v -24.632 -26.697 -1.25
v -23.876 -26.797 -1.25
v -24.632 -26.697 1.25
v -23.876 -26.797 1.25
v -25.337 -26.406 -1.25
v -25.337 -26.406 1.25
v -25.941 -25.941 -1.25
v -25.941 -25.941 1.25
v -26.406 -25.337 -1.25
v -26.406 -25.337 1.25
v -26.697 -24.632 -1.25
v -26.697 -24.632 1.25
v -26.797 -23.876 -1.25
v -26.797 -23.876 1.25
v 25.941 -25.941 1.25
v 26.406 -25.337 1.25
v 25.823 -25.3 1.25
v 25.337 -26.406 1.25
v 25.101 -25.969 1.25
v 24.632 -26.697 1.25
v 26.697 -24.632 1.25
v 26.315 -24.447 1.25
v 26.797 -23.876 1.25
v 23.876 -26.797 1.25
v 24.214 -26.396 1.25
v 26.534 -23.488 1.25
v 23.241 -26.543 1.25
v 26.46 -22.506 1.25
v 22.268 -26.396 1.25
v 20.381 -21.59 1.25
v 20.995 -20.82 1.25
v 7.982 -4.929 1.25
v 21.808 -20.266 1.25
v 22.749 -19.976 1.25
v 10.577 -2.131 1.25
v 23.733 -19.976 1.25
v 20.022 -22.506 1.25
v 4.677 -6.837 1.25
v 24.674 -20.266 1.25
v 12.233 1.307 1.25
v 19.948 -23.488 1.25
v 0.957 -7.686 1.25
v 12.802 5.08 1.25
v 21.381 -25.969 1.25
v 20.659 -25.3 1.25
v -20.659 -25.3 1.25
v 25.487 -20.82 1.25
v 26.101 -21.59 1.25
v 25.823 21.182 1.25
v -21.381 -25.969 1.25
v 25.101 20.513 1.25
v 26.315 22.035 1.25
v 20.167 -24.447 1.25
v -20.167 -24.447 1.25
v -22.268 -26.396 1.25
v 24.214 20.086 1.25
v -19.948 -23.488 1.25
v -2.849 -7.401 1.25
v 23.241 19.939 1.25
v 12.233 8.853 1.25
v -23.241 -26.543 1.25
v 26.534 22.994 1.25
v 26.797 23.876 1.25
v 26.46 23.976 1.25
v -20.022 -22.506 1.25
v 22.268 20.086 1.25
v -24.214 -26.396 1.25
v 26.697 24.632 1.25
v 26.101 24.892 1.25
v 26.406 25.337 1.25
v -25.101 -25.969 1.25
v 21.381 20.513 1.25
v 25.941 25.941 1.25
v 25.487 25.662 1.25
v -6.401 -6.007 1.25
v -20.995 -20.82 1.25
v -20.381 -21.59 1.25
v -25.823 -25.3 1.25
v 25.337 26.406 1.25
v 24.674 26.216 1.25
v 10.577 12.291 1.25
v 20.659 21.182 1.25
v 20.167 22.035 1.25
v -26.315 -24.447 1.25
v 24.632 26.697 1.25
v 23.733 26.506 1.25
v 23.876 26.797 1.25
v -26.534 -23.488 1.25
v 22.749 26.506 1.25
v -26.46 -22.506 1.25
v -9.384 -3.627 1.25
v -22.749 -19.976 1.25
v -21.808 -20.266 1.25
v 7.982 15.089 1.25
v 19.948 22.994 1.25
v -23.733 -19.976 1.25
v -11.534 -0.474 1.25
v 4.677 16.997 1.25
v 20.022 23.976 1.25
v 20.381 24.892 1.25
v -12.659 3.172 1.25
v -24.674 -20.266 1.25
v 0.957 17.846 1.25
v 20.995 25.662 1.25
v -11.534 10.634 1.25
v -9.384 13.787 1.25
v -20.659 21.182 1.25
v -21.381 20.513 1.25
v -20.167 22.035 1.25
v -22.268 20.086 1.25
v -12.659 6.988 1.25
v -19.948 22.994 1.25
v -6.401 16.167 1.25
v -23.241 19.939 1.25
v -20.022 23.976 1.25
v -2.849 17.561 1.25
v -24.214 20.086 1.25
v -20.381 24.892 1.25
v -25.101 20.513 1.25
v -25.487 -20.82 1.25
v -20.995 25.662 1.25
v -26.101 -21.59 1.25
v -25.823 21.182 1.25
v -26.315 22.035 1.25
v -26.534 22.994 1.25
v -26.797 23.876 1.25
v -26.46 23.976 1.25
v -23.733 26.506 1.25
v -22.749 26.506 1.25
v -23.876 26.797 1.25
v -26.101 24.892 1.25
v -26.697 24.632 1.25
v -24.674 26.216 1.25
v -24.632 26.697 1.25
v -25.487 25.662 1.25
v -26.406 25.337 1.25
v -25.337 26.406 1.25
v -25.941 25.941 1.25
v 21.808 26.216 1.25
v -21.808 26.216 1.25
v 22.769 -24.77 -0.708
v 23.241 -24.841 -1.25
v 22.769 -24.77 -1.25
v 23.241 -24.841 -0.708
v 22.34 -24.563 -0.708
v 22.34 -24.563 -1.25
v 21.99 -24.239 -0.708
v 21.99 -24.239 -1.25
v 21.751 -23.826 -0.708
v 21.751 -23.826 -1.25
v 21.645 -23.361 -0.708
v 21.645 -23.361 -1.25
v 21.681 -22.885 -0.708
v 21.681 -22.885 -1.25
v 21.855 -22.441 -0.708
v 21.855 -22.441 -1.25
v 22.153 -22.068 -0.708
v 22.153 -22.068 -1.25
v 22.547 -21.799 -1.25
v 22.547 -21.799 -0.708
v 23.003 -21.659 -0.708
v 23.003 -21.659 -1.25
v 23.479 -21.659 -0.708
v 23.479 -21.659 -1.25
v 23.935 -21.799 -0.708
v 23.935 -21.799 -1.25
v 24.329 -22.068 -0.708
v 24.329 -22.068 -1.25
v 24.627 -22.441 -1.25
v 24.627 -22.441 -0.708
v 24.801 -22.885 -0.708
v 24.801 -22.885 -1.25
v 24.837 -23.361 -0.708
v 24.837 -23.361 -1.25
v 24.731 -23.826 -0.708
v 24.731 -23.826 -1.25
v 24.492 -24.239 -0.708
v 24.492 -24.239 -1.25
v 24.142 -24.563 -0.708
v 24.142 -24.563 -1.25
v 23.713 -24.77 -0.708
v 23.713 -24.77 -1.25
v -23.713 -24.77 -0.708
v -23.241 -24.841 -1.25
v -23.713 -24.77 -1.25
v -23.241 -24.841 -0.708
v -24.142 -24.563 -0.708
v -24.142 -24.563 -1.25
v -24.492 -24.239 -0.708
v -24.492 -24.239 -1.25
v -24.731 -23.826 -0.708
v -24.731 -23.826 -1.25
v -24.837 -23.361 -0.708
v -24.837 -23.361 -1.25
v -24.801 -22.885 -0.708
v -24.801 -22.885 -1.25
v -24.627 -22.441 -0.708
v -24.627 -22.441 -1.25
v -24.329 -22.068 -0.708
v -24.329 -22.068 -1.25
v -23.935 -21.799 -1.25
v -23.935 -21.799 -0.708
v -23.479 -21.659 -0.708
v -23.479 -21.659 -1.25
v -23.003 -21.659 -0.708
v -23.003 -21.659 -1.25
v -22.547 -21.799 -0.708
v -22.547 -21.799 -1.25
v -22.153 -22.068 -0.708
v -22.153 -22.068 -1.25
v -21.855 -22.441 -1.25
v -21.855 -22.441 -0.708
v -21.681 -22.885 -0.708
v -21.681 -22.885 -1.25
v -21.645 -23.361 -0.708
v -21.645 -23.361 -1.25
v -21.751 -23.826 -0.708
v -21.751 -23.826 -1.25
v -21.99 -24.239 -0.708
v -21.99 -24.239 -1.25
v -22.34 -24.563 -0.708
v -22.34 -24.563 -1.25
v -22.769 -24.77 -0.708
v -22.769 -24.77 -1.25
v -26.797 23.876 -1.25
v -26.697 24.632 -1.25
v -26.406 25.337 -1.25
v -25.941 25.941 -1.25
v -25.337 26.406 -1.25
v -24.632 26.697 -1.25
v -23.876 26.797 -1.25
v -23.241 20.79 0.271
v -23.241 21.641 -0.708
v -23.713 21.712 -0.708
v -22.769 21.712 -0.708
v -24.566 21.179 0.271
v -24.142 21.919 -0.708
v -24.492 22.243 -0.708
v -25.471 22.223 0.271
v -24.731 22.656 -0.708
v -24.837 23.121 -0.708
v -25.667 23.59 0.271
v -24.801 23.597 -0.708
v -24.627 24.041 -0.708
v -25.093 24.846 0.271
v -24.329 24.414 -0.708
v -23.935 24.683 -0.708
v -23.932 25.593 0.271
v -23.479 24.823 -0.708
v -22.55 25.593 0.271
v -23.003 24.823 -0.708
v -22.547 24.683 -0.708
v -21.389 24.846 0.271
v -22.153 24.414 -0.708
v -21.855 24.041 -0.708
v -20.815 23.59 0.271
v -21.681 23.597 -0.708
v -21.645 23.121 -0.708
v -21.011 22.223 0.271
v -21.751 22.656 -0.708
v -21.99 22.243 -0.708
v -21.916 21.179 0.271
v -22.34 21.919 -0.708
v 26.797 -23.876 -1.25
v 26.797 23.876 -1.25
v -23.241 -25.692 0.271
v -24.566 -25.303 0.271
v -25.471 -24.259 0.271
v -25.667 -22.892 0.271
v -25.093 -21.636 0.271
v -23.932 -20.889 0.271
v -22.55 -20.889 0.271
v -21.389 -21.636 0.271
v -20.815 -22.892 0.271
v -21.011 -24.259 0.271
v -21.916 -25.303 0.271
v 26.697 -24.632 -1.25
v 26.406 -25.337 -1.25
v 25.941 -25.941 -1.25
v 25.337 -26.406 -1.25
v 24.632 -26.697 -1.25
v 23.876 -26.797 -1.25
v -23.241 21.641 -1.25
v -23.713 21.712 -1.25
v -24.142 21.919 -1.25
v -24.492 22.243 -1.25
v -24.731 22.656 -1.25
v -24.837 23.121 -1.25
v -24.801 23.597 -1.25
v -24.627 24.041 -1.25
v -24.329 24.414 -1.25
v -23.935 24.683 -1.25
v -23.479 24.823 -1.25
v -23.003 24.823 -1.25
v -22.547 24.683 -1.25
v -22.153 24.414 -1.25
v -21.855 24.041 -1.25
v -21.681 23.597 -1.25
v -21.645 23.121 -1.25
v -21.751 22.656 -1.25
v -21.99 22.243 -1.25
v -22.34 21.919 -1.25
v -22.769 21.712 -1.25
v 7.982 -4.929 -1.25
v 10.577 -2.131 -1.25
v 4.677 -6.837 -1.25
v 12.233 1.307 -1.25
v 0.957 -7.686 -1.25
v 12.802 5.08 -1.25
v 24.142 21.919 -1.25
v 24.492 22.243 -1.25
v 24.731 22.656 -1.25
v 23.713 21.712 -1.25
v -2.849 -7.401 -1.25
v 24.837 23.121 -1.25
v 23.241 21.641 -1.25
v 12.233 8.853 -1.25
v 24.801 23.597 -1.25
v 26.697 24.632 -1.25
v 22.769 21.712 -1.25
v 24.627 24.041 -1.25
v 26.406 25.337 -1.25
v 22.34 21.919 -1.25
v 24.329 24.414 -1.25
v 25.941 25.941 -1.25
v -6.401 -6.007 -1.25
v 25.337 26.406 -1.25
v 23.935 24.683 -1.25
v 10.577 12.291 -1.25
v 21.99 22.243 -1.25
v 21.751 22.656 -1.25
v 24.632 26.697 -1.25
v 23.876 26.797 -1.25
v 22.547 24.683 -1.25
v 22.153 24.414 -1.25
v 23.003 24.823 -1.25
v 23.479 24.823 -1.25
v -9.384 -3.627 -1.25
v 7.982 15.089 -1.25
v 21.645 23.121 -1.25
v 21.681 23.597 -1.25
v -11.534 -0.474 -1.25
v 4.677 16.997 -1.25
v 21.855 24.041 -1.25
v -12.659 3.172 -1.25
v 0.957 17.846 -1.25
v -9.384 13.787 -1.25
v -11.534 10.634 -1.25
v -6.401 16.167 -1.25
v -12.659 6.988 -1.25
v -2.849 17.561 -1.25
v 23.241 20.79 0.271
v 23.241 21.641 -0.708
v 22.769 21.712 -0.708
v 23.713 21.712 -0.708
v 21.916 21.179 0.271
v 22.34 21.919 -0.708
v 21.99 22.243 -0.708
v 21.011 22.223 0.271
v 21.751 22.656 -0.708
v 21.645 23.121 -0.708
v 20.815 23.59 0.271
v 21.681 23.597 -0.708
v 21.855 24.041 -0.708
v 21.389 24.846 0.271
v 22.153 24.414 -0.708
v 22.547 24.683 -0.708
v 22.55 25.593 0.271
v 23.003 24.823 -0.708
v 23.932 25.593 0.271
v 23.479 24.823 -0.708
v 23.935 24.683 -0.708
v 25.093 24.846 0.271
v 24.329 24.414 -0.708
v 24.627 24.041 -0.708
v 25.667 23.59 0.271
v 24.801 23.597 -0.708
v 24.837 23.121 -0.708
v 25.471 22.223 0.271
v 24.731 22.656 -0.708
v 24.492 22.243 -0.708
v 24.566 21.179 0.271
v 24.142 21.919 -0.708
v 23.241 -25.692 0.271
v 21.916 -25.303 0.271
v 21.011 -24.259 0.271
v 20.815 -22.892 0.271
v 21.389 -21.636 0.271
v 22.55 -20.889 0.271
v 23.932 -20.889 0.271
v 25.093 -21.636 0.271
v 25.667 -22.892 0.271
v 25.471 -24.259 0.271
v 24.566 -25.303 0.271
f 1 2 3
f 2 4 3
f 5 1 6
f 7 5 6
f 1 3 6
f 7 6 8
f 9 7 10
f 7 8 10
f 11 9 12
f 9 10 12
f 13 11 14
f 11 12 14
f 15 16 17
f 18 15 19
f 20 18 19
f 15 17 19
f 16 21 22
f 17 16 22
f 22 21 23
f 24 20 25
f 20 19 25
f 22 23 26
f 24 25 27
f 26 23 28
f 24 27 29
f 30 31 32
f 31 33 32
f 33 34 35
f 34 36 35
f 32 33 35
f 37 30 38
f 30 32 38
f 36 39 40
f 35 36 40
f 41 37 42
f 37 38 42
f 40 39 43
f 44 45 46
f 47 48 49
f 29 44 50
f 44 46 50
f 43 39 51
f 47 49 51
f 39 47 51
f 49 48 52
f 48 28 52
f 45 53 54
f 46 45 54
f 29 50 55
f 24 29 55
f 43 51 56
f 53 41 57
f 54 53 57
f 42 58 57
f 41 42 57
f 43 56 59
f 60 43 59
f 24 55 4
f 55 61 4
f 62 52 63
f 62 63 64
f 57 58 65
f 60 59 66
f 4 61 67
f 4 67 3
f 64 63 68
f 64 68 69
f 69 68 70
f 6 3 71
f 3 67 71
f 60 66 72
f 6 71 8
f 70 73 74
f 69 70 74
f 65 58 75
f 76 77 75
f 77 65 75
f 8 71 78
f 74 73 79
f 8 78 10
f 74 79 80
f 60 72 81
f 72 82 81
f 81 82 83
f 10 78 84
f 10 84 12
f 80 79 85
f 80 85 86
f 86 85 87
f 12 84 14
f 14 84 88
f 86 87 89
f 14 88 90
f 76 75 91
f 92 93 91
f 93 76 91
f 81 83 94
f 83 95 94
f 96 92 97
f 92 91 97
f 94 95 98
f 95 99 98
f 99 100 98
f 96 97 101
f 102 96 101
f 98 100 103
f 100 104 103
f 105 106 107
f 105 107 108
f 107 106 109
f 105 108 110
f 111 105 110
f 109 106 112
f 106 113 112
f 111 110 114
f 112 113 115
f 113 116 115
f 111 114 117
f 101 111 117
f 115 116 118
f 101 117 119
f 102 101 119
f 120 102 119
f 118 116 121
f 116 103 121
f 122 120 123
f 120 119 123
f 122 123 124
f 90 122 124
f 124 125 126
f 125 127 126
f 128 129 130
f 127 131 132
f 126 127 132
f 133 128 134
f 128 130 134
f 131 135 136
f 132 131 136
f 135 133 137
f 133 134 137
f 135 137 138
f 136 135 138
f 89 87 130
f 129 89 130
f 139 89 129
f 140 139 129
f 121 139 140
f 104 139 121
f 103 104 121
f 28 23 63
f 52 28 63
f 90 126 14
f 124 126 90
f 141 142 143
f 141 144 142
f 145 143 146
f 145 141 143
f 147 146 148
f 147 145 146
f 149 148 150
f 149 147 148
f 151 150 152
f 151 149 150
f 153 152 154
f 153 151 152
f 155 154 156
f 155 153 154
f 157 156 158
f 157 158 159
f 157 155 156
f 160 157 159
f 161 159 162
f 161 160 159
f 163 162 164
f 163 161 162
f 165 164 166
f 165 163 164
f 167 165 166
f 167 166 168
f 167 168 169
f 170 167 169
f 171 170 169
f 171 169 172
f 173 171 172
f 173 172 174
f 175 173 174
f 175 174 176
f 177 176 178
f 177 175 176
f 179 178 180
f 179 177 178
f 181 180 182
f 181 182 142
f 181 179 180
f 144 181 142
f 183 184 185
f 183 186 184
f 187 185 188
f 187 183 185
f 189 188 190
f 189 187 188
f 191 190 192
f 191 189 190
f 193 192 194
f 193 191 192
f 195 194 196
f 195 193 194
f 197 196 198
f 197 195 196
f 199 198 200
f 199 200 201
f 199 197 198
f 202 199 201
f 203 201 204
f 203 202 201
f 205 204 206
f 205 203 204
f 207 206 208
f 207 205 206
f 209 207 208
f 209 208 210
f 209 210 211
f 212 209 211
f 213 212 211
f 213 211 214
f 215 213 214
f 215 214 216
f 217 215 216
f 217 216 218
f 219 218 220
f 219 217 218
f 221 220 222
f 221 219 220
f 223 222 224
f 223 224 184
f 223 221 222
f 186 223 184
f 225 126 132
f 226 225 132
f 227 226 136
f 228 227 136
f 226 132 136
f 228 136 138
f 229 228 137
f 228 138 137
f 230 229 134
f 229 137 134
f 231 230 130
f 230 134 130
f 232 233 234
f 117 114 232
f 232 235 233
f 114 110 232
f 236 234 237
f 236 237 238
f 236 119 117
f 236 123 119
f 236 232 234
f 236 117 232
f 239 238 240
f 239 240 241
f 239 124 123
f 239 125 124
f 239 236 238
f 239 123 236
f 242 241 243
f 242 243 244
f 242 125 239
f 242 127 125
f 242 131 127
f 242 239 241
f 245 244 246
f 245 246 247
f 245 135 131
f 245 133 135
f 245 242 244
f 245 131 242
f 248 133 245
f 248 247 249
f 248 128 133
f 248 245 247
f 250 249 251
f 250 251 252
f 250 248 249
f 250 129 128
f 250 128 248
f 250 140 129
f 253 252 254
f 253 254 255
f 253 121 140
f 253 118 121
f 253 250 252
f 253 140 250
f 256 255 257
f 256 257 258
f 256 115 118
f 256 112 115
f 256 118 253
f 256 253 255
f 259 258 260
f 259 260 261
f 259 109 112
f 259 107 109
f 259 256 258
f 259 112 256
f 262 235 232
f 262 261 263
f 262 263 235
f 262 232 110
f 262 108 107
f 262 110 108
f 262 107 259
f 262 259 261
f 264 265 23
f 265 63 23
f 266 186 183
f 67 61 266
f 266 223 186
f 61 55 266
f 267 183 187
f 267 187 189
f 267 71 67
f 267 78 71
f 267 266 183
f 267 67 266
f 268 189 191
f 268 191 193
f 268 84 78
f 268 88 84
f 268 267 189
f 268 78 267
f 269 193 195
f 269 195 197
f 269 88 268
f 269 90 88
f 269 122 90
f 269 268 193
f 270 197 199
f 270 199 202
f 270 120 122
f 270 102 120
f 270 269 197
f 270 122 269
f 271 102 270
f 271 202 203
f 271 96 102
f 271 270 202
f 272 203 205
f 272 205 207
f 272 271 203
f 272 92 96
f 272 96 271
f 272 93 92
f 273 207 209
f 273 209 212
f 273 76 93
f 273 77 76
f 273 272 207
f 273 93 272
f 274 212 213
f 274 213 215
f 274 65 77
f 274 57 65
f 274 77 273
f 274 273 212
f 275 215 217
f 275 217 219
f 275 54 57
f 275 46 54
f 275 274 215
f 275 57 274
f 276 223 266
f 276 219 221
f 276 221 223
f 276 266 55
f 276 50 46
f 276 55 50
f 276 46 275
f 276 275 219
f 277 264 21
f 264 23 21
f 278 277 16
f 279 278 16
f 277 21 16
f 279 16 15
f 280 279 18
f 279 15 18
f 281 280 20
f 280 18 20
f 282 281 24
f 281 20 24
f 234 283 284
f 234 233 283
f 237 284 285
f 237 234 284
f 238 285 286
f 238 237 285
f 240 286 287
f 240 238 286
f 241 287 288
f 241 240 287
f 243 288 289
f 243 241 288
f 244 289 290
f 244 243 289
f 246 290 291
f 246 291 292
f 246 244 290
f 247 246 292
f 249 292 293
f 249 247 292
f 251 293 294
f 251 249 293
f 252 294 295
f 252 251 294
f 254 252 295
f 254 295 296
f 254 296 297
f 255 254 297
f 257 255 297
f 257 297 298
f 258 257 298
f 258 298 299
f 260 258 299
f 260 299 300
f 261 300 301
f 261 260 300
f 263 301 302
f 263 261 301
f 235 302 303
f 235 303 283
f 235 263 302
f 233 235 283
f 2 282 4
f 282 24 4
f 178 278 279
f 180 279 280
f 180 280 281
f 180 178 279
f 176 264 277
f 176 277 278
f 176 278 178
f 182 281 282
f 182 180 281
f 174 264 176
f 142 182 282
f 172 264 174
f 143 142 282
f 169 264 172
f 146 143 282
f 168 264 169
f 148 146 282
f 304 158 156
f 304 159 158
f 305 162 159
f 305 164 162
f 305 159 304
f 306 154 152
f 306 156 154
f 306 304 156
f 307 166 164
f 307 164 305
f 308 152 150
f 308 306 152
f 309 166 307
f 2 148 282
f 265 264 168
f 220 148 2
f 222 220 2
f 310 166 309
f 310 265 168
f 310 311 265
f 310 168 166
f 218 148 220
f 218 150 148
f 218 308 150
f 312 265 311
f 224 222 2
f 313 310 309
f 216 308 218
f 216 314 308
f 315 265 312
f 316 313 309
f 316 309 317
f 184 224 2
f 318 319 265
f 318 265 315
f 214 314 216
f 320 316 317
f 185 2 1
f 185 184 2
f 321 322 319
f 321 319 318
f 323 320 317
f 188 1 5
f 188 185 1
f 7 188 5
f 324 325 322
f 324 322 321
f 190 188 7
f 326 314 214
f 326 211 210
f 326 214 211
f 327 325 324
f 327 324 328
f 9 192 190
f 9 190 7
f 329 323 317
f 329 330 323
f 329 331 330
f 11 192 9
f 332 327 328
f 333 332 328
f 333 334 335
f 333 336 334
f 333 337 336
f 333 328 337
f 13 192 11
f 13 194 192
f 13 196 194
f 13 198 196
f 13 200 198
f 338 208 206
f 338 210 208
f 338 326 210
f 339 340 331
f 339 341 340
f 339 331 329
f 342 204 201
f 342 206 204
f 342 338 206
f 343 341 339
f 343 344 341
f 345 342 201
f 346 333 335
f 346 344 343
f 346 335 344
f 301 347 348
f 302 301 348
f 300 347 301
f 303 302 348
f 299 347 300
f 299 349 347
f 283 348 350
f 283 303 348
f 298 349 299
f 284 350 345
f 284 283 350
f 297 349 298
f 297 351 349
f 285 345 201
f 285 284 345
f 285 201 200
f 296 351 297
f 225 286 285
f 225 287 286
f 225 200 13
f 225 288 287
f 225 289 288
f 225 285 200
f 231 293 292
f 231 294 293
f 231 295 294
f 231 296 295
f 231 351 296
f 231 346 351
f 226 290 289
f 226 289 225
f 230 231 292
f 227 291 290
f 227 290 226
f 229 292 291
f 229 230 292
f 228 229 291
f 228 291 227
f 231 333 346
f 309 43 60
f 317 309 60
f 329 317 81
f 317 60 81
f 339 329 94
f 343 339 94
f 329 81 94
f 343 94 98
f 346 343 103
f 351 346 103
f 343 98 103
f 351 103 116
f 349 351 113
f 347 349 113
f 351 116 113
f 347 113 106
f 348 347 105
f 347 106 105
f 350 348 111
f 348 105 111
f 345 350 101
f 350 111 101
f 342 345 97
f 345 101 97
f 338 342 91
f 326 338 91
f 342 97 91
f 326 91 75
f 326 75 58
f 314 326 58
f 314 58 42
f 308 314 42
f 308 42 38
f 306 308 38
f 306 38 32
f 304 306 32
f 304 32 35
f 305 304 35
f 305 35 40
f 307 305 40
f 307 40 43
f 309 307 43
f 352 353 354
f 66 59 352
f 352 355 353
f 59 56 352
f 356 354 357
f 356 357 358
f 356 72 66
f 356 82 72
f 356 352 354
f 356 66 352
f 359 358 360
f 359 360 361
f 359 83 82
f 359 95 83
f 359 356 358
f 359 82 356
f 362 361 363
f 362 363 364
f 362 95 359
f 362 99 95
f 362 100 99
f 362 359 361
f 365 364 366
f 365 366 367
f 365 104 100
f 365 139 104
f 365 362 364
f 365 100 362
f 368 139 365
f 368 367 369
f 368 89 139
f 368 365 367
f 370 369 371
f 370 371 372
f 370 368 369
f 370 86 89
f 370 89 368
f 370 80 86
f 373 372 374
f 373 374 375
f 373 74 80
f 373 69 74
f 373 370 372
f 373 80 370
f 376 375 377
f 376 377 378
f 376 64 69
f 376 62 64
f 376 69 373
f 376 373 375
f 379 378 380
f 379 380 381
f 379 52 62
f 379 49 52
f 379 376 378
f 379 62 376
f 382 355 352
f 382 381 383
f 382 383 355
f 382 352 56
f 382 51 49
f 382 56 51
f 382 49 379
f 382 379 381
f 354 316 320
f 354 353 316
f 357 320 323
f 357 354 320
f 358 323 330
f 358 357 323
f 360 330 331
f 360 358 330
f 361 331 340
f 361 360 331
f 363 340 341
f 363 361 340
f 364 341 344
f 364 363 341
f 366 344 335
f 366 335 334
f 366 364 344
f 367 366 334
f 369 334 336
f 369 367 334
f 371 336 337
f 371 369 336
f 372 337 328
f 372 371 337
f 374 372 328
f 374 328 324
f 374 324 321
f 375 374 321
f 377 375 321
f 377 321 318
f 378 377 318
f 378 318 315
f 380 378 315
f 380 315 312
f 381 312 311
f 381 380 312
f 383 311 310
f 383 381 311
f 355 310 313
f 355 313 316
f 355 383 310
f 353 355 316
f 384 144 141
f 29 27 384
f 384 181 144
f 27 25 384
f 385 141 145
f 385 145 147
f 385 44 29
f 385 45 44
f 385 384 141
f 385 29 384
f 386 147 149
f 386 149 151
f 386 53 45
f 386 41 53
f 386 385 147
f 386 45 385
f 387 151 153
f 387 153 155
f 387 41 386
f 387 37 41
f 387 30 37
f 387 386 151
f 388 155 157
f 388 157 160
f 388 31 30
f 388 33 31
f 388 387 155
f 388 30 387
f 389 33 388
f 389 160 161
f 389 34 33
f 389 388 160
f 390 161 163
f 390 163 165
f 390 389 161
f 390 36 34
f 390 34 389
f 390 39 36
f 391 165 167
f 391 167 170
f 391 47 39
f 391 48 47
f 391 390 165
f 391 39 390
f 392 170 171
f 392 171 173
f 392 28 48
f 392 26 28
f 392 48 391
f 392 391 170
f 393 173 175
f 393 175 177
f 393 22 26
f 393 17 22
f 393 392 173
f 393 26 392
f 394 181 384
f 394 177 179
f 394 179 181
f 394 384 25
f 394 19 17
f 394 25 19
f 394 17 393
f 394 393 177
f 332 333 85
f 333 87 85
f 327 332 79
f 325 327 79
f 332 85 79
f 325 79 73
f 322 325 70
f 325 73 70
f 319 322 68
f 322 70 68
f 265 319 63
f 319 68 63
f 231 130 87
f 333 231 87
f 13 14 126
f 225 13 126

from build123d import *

# Parameters (mm, degrees)
BOSS_EXTRUDE1_DEPTH                           = 1.25
CSK_FOR_4_FLAT_HEAD_MACHINE_SCREW1_AT_2_COUNT = 2
CSK_FOR_4_FLAT_HEAD_MACHINE_SCREW1_AT_2_PITCH = 65.735474806
CSK_FOR_4_FLAT_HEAD_MACHINE_SCREW1_AT_3_COUNT = 2
CSK_FOR_4_FLAT_HEAD_MACHINE_SCREW1_AT_3_PITCH = 46.482
CSK_FOR_4_FLAT_HEAD_MACHINE_SCREW1_AT_4_COUNT = 2
CSK_FOR_4_FLAT_HEAD_MACHINE_SCREW1_AT_4_PITCH = 46.482
SKETCH7_R                                     = 12.8016
CUT_EXTRUDE1_DEPTH                            = 3.5


with BuildPart() as part:
    # Sketch1 → Boss-Extrude1 (new body, symmetric)
    with BuildSketch(Plane.XY):
        with BuildLine():
            Line((-23.876, 26.797), (23.876, 26.797))
            ThreePointArc((23.876, 26.797), (25.941458908, 25.941458908), (26.797, 23.876))
            Line((26.797, 23.876), (26.797, -23.876))
            ThreePointArc((26.797, -23.876), (25.941458908, -25.941458908), (23.876, -26.797))
            Line((23.876, -26.797), (-23.876, -26.797))
            ThreePointArc((-23.876, -26.797), (-25.941458908, -25.941458908), (-26.797, -23.876))
            Line((-26.797, -23.876), (-26.797, 23.876))
            ThreePointArc((-26.797, 23.876), (-25.941458908, 25.941458908), (-23.876, 26.797))
        make_face()
    extrude(amount=BOSS_EXTRUDE1_DEPTH, both=True)

    # Sketch5 → CSK for #4 Flat Head Machine Screw1 (revolve, cut)
    with BuildSketch(Plane(origin=(-23.241, 23.241, 1.25), x_dir=(0, -1, 0), z_dir=(1, 0, 0))):
        Polygon((0, 0), (0, 2.5), (1.6002, 2.5), (1.6002, 1.957696955), (3.302, 0), align=None)
    csk_for_4_flat_head_machine_screw1 = revolve(axis=Axis((-23.241, 23.241, 7.6), (0, 0, -1)), mode=Mode.SUBTRACT)

    # CSK for #4 Flat Head Machine Screw1 at 2: CSK for #4 Flat Head Machine Screw1 ×2
    with Locations(*[Vector(0.707106781, -0.707106781, 0) * (i * CSK_FOR_4_FLAT_HEAD_MACHINE_SCREW1_AT_2_PITCH) for i in range(1, CSK_FOR_4_FLAT_HEAD_MACHINE_SCREW1_AT_2_COUNT)]):
        add(csk_for_4_flat_head_machine_screw1, mode=Mode.SUBTRACT)

    # CSK for #4 Flat Head Machine Screw1 at 3: CSK for #4 Flat Head Machine Screw1 ×2
    with Locations(*[(i * CSK_FOR_4_FLAT_HEAD_MACHINE_SCREW1_AT_3_PITCH, 0, 0) for i in range(1, CSK_FOR_4_FLAT_HEAD_MACHINE_SCREW1_AT_3_COUNT)]):
        add(csk_for_4_flat_head_machine_screw1, mode=Mode.SUBTRACT)

    # CSK for #4 Flat Head Machine Screw1 at 4: CSK for #4 Flat Head Machine Screw1 ×2
    with Locations(*[(0, -i * CSK_FOR_4_FLAT_HEAD_MACHINE_SCREW1_AT_4_PITCH, 0) for i in range(1, CSK_FOR_4_FLAT_HEAD_MACHINE_SCREW1_AT_4_COUNT)]):
        add(csk_for_4_flat_head_machine_screw1, mode=Mode.SUBTRACT)

    # Sketch7 → Cut-Extrude1 (cut, through all)
    with BuildSketch(Plane.XY.offset(1.25)):
        with Locations((0, 5.08)):
            Circle(SKETCH7_R)
    extrude(amount=-CUT_EXTRUDE1_DEPTH, mode=Mode.SUBTRACT)


solid = part.part
